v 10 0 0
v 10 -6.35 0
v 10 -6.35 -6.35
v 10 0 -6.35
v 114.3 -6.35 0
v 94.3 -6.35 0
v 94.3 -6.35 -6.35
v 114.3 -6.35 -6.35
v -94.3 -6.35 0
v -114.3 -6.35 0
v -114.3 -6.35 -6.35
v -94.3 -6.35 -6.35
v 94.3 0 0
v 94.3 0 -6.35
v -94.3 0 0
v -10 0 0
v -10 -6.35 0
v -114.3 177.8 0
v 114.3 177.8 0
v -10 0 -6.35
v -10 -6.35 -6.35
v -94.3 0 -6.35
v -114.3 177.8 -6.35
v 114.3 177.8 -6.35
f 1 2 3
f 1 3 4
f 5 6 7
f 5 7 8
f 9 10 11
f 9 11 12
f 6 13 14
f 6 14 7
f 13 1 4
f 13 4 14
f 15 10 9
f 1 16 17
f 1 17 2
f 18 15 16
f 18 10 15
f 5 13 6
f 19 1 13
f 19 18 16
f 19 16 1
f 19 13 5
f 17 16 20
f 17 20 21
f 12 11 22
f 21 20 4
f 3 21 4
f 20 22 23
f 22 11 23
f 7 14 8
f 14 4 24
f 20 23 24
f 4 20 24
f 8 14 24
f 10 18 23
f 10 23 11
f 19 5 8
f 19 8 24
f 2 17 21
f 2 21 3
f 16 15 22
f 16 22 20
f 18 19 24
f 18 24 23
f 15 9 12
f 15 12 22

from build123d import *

# Parameters (mm, degrees)
BOSS_EXTRUDE1_DEPTH = 6.35


with BuildPart() as part:
    # Sketch1 → Boss-Extrude1 (new body)
    with BuildSketch(Plane.XY):
        Polygon((114.3, -6.35), (114.3, 0), (114.3, 177.8), (-114.3, 177.8), (-114.3, 0), (-114.3, -6.35), (-94.3, -6.35), (-94.3, 0), (-10, 0), (-10, -6.35), (10, -6.35), (10, 0), (94.3, 0), (94.3, -6.35), align=None)
    extrude(amount=-BOSS_EXTRUDE1_DEPTH)


solid = part.part
